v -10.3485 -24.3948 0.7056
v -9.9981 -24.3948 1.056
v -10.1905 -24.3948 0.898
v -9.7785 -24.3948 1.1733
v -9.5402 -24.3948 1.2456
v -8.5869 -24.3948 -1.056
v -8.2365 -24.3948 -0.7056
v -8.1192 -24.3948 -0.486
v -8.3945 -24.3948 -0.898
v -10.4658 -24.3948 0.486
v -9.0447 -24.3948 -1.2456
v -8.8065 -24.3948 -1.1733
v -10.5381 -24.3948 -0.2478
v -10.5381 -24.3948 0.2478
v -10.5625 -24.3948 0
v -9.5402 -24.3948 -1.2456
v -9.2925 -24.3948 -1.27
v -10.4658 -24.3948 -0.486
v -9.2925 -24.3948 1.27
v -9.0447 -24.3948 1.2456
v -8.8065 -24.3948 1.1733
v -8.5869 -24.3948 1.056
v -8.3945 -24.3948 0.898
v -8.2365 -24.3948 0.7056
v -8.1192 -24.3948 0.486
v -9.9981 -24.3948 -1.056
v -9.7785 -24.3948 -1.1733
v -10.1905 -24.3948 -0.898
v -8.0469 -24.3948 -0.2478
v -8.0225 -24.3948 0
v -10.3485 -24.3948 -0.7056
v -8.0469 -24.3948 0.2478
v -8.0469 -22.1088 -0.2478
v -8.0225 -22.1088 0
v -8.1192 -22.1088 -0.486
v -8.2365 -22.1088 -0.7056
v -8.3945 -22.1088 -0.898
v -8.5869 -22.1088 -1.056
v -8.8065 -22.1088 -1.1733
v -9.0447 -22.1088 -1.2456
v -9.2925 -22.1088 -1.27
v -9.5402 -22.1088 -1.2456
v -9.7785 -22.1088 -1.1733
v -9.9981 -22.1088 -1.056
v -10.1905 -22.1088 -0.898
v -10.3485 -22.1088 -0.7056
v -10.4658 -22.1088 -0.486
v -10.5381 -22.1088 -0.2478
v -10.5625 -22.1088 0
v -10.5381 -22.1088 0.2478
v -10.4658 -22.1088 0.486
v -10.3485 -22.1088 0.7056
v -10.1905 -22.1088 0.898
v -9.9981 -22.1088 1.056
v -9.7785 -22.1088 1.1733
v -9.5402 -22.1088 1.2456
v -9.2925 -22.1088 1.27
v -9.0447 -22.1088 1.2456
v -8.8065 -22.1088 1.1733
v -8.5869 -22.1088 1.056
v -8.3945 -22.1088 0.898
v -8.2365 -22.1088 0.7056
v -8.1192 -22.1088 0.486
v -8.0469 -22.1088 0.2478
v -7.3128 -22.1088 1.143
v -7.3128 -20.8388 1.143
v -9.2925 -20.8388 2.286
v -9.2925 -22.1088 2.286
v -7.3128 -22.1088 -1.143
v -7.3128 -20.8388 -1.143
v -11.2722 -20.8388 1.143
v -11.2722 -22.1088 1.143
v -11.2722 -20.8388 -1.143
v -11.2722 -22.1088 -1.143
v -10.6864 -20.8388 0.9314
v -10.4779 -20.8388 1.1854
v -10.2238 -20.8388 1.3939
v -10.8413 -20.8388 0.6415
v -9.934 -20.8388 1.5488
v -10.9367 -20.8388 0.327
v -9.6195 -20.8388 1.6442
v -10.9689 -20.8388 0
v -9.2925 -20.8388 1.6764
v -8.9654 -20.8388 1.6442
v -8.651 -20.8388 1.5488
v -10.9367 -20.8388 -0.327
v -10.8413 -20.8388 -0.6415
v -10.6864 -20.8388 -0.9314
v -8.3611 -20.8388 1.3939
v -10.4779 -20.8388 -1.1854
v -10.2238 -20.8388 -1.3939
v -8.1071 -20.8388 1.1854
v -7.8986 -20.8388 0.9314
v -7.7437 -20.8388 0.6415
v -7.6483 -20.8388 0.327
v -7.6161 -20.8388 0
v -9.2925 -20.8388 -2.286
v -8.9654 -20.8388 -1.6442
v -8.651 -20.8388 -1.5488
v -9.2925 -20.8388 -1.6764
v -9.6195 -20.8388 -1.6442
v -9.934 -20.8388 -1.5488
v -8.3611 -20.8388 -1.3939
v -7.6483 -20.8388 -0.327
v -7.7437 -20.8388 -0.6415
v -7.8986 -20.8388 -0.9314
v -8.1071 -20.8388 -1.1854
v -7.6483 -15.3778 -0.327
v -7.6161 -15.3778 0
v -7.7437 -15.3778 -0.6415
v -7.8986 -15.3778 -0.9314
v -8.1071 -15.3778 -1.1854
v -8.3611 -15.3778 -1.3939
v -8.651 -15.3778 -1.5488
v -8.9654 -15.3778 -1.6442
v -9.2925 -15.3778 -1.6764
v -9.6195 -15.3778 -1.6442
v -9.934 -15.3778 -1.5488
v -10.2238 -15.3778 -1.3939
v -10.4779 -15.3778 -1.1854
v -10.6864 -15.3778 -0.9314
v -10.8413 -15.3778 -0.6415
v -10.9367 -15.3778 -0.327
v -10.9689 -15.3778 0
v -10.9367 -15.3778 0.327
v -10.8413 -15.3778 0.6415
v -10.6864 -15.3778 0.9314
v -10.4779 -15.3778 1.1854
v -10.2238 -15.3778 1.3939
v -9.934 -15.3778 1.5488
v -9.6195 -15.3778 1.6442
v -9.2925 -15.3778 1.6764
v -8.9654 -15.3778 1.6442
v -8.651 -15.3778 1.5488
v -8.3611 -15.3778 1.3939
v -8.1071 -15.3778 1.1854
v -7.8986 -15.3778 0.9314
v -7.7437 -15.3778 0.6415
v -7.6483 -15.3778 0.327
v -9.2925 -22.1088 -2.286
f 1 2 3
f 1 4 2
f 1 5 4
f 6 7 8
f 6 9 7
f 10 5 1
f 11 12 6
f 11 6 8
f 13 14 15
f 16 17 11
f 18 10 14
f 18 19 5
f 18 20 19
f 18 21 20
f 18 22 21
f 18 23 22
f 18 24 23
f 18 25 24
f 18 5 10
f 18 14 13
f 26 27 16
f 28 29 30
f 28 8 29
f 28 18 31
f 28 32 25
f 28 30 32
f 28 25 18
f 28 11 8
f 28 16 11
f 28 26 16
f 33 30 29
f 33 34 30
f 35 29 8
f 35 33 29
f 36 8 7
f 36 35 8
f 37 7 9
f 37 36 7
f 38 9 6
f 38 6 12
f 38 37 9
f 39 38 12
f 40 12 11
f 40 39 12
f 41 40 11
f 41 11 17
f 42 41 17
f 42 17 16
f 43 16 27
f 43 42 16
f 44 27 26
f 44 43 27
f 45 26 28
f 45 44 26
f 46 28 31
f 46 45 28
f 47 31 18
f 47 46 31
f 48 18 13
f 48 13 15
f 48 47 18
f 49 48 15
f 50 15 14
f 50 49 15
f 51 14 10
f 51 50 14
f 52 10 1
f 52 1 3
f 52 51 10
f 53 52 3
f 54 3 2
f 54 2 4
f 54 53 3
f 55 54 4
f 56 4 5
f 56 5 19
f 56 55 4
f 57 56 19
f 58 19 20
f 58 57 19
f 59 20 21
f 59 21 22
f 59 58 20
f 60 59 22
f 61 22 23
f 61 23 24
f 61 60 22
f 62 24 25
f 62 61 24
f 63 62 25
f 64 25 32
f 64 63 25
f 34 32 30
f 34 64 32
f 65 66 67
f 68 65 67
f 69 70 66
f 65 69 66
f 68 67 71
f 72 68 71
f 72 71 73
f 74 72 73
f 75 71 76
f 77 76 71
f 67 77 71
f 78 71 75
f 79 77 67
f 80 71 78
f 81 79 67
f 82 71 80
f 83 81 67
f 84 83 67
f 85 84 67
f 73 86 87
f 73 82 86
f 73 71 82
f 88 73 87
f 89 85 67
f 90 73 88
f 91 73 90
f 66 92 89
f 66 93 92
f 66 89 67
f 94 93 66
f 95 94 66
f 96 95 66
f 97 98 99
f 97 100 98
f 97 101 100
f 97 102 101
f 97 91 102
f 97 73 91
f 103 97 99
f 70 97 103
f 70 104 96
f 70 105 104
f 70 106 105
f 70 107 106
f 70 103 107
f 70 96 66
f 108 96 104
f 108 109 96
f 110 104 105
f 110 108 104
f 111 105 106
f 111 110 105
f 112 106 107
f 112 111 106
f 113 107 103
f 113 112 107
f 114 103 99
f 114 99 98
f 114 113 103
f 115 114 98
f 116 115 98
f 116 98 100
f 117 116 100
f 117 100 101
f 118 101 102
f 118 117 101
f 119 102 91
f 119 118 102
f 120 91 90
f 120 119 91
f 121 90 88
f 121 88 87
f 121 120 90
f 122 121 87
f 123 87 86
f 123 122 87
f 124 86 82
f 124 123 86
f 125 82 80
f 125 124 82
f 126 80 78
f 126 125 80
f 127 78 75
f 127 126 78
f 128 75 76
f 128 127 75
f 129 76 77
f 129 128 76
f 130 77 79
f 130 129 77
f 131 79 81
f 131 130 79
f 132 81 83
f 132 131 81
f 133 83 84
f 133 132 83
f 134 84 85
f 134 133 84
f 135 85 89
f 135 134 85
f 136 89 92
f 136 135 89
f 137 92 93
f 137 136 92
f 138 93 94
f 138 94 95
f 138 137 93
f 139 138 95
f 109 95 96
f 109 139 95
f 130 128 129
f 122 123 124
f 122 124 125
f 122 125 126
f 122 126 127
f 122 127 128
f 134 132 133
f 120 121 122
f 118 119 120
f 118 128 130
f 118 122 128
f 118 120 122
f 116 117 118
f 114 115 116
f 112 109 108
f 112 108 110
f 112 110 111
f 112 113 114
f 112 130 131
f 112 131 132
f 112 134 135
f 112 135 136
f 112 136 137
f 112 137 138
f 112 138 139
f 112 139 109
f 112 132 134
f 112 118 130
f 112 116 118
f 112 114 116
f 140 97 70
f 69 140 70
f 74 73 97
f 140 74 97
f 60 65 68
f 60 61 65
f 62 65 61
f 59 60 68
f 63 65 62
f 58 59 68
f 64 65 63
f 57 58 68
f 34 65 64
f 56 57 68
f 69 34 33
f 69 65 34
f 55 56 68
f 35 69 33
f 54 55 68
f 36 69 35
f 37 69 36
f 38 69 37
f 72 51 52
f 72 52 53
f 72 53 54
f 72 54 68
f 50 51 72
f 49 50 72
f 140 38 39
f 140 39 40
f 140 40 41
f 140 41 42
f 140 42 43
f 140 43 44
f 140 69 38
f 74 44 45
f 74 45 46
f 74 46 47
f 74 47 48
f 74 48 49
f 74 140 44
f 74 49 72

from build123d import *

# Parameters (mm, degrees)
SKETCH2_R          = 3.048
CUT_EXTRUDE1_DEPTH = 2.54


# Read off the part's stored shape, not the designer's step: Revolve1
with BuildPart() as part:
    # Revolve1 outline → Revolve1 (revolve)
    with BuildSketch(Plane(origin=(-9.292485091, 0, 0), x_dir=(1, 0, 0), z_dir=(0, 0, 1))):
        Polygon((0, -15.377840902), (0, -24.394840902), (1.27, -24.394840902), (1.27, -22.108840902), (3.048, -22.108840902), (3.048, -20.838840902), (1.6764, -20.838840902), (1.6764, -15.377840902), align=None)
    revolve(axis=Axis((-9.292485091, 0, 0), (0, 1, 0)))

    # Sketch2 → Cut-Extrude1 (cut)
    with BuildSketch(Plane(origin=(0, -20.838840902, 0), x_dir=(1, 0, 0), z_dir=(0, 1, 0))):
        with Locations((-9.292485091, 0)):
            Circle(SKETCH2_R)
        Polygon((-9.292485091, 2.286), (-7.312751018, 1.143), (-7.312751018, -1.143), (-9.292485091, -2.286), (-11.272219164, -1.143), (-11.272219164, 1.143), align=None, mode=Mode.SUBTRACT)
    extrude(amount=-CUT_EXTRUDE1_DEPTH, mode=Mode.SUBTRACT)


solid = part.part
